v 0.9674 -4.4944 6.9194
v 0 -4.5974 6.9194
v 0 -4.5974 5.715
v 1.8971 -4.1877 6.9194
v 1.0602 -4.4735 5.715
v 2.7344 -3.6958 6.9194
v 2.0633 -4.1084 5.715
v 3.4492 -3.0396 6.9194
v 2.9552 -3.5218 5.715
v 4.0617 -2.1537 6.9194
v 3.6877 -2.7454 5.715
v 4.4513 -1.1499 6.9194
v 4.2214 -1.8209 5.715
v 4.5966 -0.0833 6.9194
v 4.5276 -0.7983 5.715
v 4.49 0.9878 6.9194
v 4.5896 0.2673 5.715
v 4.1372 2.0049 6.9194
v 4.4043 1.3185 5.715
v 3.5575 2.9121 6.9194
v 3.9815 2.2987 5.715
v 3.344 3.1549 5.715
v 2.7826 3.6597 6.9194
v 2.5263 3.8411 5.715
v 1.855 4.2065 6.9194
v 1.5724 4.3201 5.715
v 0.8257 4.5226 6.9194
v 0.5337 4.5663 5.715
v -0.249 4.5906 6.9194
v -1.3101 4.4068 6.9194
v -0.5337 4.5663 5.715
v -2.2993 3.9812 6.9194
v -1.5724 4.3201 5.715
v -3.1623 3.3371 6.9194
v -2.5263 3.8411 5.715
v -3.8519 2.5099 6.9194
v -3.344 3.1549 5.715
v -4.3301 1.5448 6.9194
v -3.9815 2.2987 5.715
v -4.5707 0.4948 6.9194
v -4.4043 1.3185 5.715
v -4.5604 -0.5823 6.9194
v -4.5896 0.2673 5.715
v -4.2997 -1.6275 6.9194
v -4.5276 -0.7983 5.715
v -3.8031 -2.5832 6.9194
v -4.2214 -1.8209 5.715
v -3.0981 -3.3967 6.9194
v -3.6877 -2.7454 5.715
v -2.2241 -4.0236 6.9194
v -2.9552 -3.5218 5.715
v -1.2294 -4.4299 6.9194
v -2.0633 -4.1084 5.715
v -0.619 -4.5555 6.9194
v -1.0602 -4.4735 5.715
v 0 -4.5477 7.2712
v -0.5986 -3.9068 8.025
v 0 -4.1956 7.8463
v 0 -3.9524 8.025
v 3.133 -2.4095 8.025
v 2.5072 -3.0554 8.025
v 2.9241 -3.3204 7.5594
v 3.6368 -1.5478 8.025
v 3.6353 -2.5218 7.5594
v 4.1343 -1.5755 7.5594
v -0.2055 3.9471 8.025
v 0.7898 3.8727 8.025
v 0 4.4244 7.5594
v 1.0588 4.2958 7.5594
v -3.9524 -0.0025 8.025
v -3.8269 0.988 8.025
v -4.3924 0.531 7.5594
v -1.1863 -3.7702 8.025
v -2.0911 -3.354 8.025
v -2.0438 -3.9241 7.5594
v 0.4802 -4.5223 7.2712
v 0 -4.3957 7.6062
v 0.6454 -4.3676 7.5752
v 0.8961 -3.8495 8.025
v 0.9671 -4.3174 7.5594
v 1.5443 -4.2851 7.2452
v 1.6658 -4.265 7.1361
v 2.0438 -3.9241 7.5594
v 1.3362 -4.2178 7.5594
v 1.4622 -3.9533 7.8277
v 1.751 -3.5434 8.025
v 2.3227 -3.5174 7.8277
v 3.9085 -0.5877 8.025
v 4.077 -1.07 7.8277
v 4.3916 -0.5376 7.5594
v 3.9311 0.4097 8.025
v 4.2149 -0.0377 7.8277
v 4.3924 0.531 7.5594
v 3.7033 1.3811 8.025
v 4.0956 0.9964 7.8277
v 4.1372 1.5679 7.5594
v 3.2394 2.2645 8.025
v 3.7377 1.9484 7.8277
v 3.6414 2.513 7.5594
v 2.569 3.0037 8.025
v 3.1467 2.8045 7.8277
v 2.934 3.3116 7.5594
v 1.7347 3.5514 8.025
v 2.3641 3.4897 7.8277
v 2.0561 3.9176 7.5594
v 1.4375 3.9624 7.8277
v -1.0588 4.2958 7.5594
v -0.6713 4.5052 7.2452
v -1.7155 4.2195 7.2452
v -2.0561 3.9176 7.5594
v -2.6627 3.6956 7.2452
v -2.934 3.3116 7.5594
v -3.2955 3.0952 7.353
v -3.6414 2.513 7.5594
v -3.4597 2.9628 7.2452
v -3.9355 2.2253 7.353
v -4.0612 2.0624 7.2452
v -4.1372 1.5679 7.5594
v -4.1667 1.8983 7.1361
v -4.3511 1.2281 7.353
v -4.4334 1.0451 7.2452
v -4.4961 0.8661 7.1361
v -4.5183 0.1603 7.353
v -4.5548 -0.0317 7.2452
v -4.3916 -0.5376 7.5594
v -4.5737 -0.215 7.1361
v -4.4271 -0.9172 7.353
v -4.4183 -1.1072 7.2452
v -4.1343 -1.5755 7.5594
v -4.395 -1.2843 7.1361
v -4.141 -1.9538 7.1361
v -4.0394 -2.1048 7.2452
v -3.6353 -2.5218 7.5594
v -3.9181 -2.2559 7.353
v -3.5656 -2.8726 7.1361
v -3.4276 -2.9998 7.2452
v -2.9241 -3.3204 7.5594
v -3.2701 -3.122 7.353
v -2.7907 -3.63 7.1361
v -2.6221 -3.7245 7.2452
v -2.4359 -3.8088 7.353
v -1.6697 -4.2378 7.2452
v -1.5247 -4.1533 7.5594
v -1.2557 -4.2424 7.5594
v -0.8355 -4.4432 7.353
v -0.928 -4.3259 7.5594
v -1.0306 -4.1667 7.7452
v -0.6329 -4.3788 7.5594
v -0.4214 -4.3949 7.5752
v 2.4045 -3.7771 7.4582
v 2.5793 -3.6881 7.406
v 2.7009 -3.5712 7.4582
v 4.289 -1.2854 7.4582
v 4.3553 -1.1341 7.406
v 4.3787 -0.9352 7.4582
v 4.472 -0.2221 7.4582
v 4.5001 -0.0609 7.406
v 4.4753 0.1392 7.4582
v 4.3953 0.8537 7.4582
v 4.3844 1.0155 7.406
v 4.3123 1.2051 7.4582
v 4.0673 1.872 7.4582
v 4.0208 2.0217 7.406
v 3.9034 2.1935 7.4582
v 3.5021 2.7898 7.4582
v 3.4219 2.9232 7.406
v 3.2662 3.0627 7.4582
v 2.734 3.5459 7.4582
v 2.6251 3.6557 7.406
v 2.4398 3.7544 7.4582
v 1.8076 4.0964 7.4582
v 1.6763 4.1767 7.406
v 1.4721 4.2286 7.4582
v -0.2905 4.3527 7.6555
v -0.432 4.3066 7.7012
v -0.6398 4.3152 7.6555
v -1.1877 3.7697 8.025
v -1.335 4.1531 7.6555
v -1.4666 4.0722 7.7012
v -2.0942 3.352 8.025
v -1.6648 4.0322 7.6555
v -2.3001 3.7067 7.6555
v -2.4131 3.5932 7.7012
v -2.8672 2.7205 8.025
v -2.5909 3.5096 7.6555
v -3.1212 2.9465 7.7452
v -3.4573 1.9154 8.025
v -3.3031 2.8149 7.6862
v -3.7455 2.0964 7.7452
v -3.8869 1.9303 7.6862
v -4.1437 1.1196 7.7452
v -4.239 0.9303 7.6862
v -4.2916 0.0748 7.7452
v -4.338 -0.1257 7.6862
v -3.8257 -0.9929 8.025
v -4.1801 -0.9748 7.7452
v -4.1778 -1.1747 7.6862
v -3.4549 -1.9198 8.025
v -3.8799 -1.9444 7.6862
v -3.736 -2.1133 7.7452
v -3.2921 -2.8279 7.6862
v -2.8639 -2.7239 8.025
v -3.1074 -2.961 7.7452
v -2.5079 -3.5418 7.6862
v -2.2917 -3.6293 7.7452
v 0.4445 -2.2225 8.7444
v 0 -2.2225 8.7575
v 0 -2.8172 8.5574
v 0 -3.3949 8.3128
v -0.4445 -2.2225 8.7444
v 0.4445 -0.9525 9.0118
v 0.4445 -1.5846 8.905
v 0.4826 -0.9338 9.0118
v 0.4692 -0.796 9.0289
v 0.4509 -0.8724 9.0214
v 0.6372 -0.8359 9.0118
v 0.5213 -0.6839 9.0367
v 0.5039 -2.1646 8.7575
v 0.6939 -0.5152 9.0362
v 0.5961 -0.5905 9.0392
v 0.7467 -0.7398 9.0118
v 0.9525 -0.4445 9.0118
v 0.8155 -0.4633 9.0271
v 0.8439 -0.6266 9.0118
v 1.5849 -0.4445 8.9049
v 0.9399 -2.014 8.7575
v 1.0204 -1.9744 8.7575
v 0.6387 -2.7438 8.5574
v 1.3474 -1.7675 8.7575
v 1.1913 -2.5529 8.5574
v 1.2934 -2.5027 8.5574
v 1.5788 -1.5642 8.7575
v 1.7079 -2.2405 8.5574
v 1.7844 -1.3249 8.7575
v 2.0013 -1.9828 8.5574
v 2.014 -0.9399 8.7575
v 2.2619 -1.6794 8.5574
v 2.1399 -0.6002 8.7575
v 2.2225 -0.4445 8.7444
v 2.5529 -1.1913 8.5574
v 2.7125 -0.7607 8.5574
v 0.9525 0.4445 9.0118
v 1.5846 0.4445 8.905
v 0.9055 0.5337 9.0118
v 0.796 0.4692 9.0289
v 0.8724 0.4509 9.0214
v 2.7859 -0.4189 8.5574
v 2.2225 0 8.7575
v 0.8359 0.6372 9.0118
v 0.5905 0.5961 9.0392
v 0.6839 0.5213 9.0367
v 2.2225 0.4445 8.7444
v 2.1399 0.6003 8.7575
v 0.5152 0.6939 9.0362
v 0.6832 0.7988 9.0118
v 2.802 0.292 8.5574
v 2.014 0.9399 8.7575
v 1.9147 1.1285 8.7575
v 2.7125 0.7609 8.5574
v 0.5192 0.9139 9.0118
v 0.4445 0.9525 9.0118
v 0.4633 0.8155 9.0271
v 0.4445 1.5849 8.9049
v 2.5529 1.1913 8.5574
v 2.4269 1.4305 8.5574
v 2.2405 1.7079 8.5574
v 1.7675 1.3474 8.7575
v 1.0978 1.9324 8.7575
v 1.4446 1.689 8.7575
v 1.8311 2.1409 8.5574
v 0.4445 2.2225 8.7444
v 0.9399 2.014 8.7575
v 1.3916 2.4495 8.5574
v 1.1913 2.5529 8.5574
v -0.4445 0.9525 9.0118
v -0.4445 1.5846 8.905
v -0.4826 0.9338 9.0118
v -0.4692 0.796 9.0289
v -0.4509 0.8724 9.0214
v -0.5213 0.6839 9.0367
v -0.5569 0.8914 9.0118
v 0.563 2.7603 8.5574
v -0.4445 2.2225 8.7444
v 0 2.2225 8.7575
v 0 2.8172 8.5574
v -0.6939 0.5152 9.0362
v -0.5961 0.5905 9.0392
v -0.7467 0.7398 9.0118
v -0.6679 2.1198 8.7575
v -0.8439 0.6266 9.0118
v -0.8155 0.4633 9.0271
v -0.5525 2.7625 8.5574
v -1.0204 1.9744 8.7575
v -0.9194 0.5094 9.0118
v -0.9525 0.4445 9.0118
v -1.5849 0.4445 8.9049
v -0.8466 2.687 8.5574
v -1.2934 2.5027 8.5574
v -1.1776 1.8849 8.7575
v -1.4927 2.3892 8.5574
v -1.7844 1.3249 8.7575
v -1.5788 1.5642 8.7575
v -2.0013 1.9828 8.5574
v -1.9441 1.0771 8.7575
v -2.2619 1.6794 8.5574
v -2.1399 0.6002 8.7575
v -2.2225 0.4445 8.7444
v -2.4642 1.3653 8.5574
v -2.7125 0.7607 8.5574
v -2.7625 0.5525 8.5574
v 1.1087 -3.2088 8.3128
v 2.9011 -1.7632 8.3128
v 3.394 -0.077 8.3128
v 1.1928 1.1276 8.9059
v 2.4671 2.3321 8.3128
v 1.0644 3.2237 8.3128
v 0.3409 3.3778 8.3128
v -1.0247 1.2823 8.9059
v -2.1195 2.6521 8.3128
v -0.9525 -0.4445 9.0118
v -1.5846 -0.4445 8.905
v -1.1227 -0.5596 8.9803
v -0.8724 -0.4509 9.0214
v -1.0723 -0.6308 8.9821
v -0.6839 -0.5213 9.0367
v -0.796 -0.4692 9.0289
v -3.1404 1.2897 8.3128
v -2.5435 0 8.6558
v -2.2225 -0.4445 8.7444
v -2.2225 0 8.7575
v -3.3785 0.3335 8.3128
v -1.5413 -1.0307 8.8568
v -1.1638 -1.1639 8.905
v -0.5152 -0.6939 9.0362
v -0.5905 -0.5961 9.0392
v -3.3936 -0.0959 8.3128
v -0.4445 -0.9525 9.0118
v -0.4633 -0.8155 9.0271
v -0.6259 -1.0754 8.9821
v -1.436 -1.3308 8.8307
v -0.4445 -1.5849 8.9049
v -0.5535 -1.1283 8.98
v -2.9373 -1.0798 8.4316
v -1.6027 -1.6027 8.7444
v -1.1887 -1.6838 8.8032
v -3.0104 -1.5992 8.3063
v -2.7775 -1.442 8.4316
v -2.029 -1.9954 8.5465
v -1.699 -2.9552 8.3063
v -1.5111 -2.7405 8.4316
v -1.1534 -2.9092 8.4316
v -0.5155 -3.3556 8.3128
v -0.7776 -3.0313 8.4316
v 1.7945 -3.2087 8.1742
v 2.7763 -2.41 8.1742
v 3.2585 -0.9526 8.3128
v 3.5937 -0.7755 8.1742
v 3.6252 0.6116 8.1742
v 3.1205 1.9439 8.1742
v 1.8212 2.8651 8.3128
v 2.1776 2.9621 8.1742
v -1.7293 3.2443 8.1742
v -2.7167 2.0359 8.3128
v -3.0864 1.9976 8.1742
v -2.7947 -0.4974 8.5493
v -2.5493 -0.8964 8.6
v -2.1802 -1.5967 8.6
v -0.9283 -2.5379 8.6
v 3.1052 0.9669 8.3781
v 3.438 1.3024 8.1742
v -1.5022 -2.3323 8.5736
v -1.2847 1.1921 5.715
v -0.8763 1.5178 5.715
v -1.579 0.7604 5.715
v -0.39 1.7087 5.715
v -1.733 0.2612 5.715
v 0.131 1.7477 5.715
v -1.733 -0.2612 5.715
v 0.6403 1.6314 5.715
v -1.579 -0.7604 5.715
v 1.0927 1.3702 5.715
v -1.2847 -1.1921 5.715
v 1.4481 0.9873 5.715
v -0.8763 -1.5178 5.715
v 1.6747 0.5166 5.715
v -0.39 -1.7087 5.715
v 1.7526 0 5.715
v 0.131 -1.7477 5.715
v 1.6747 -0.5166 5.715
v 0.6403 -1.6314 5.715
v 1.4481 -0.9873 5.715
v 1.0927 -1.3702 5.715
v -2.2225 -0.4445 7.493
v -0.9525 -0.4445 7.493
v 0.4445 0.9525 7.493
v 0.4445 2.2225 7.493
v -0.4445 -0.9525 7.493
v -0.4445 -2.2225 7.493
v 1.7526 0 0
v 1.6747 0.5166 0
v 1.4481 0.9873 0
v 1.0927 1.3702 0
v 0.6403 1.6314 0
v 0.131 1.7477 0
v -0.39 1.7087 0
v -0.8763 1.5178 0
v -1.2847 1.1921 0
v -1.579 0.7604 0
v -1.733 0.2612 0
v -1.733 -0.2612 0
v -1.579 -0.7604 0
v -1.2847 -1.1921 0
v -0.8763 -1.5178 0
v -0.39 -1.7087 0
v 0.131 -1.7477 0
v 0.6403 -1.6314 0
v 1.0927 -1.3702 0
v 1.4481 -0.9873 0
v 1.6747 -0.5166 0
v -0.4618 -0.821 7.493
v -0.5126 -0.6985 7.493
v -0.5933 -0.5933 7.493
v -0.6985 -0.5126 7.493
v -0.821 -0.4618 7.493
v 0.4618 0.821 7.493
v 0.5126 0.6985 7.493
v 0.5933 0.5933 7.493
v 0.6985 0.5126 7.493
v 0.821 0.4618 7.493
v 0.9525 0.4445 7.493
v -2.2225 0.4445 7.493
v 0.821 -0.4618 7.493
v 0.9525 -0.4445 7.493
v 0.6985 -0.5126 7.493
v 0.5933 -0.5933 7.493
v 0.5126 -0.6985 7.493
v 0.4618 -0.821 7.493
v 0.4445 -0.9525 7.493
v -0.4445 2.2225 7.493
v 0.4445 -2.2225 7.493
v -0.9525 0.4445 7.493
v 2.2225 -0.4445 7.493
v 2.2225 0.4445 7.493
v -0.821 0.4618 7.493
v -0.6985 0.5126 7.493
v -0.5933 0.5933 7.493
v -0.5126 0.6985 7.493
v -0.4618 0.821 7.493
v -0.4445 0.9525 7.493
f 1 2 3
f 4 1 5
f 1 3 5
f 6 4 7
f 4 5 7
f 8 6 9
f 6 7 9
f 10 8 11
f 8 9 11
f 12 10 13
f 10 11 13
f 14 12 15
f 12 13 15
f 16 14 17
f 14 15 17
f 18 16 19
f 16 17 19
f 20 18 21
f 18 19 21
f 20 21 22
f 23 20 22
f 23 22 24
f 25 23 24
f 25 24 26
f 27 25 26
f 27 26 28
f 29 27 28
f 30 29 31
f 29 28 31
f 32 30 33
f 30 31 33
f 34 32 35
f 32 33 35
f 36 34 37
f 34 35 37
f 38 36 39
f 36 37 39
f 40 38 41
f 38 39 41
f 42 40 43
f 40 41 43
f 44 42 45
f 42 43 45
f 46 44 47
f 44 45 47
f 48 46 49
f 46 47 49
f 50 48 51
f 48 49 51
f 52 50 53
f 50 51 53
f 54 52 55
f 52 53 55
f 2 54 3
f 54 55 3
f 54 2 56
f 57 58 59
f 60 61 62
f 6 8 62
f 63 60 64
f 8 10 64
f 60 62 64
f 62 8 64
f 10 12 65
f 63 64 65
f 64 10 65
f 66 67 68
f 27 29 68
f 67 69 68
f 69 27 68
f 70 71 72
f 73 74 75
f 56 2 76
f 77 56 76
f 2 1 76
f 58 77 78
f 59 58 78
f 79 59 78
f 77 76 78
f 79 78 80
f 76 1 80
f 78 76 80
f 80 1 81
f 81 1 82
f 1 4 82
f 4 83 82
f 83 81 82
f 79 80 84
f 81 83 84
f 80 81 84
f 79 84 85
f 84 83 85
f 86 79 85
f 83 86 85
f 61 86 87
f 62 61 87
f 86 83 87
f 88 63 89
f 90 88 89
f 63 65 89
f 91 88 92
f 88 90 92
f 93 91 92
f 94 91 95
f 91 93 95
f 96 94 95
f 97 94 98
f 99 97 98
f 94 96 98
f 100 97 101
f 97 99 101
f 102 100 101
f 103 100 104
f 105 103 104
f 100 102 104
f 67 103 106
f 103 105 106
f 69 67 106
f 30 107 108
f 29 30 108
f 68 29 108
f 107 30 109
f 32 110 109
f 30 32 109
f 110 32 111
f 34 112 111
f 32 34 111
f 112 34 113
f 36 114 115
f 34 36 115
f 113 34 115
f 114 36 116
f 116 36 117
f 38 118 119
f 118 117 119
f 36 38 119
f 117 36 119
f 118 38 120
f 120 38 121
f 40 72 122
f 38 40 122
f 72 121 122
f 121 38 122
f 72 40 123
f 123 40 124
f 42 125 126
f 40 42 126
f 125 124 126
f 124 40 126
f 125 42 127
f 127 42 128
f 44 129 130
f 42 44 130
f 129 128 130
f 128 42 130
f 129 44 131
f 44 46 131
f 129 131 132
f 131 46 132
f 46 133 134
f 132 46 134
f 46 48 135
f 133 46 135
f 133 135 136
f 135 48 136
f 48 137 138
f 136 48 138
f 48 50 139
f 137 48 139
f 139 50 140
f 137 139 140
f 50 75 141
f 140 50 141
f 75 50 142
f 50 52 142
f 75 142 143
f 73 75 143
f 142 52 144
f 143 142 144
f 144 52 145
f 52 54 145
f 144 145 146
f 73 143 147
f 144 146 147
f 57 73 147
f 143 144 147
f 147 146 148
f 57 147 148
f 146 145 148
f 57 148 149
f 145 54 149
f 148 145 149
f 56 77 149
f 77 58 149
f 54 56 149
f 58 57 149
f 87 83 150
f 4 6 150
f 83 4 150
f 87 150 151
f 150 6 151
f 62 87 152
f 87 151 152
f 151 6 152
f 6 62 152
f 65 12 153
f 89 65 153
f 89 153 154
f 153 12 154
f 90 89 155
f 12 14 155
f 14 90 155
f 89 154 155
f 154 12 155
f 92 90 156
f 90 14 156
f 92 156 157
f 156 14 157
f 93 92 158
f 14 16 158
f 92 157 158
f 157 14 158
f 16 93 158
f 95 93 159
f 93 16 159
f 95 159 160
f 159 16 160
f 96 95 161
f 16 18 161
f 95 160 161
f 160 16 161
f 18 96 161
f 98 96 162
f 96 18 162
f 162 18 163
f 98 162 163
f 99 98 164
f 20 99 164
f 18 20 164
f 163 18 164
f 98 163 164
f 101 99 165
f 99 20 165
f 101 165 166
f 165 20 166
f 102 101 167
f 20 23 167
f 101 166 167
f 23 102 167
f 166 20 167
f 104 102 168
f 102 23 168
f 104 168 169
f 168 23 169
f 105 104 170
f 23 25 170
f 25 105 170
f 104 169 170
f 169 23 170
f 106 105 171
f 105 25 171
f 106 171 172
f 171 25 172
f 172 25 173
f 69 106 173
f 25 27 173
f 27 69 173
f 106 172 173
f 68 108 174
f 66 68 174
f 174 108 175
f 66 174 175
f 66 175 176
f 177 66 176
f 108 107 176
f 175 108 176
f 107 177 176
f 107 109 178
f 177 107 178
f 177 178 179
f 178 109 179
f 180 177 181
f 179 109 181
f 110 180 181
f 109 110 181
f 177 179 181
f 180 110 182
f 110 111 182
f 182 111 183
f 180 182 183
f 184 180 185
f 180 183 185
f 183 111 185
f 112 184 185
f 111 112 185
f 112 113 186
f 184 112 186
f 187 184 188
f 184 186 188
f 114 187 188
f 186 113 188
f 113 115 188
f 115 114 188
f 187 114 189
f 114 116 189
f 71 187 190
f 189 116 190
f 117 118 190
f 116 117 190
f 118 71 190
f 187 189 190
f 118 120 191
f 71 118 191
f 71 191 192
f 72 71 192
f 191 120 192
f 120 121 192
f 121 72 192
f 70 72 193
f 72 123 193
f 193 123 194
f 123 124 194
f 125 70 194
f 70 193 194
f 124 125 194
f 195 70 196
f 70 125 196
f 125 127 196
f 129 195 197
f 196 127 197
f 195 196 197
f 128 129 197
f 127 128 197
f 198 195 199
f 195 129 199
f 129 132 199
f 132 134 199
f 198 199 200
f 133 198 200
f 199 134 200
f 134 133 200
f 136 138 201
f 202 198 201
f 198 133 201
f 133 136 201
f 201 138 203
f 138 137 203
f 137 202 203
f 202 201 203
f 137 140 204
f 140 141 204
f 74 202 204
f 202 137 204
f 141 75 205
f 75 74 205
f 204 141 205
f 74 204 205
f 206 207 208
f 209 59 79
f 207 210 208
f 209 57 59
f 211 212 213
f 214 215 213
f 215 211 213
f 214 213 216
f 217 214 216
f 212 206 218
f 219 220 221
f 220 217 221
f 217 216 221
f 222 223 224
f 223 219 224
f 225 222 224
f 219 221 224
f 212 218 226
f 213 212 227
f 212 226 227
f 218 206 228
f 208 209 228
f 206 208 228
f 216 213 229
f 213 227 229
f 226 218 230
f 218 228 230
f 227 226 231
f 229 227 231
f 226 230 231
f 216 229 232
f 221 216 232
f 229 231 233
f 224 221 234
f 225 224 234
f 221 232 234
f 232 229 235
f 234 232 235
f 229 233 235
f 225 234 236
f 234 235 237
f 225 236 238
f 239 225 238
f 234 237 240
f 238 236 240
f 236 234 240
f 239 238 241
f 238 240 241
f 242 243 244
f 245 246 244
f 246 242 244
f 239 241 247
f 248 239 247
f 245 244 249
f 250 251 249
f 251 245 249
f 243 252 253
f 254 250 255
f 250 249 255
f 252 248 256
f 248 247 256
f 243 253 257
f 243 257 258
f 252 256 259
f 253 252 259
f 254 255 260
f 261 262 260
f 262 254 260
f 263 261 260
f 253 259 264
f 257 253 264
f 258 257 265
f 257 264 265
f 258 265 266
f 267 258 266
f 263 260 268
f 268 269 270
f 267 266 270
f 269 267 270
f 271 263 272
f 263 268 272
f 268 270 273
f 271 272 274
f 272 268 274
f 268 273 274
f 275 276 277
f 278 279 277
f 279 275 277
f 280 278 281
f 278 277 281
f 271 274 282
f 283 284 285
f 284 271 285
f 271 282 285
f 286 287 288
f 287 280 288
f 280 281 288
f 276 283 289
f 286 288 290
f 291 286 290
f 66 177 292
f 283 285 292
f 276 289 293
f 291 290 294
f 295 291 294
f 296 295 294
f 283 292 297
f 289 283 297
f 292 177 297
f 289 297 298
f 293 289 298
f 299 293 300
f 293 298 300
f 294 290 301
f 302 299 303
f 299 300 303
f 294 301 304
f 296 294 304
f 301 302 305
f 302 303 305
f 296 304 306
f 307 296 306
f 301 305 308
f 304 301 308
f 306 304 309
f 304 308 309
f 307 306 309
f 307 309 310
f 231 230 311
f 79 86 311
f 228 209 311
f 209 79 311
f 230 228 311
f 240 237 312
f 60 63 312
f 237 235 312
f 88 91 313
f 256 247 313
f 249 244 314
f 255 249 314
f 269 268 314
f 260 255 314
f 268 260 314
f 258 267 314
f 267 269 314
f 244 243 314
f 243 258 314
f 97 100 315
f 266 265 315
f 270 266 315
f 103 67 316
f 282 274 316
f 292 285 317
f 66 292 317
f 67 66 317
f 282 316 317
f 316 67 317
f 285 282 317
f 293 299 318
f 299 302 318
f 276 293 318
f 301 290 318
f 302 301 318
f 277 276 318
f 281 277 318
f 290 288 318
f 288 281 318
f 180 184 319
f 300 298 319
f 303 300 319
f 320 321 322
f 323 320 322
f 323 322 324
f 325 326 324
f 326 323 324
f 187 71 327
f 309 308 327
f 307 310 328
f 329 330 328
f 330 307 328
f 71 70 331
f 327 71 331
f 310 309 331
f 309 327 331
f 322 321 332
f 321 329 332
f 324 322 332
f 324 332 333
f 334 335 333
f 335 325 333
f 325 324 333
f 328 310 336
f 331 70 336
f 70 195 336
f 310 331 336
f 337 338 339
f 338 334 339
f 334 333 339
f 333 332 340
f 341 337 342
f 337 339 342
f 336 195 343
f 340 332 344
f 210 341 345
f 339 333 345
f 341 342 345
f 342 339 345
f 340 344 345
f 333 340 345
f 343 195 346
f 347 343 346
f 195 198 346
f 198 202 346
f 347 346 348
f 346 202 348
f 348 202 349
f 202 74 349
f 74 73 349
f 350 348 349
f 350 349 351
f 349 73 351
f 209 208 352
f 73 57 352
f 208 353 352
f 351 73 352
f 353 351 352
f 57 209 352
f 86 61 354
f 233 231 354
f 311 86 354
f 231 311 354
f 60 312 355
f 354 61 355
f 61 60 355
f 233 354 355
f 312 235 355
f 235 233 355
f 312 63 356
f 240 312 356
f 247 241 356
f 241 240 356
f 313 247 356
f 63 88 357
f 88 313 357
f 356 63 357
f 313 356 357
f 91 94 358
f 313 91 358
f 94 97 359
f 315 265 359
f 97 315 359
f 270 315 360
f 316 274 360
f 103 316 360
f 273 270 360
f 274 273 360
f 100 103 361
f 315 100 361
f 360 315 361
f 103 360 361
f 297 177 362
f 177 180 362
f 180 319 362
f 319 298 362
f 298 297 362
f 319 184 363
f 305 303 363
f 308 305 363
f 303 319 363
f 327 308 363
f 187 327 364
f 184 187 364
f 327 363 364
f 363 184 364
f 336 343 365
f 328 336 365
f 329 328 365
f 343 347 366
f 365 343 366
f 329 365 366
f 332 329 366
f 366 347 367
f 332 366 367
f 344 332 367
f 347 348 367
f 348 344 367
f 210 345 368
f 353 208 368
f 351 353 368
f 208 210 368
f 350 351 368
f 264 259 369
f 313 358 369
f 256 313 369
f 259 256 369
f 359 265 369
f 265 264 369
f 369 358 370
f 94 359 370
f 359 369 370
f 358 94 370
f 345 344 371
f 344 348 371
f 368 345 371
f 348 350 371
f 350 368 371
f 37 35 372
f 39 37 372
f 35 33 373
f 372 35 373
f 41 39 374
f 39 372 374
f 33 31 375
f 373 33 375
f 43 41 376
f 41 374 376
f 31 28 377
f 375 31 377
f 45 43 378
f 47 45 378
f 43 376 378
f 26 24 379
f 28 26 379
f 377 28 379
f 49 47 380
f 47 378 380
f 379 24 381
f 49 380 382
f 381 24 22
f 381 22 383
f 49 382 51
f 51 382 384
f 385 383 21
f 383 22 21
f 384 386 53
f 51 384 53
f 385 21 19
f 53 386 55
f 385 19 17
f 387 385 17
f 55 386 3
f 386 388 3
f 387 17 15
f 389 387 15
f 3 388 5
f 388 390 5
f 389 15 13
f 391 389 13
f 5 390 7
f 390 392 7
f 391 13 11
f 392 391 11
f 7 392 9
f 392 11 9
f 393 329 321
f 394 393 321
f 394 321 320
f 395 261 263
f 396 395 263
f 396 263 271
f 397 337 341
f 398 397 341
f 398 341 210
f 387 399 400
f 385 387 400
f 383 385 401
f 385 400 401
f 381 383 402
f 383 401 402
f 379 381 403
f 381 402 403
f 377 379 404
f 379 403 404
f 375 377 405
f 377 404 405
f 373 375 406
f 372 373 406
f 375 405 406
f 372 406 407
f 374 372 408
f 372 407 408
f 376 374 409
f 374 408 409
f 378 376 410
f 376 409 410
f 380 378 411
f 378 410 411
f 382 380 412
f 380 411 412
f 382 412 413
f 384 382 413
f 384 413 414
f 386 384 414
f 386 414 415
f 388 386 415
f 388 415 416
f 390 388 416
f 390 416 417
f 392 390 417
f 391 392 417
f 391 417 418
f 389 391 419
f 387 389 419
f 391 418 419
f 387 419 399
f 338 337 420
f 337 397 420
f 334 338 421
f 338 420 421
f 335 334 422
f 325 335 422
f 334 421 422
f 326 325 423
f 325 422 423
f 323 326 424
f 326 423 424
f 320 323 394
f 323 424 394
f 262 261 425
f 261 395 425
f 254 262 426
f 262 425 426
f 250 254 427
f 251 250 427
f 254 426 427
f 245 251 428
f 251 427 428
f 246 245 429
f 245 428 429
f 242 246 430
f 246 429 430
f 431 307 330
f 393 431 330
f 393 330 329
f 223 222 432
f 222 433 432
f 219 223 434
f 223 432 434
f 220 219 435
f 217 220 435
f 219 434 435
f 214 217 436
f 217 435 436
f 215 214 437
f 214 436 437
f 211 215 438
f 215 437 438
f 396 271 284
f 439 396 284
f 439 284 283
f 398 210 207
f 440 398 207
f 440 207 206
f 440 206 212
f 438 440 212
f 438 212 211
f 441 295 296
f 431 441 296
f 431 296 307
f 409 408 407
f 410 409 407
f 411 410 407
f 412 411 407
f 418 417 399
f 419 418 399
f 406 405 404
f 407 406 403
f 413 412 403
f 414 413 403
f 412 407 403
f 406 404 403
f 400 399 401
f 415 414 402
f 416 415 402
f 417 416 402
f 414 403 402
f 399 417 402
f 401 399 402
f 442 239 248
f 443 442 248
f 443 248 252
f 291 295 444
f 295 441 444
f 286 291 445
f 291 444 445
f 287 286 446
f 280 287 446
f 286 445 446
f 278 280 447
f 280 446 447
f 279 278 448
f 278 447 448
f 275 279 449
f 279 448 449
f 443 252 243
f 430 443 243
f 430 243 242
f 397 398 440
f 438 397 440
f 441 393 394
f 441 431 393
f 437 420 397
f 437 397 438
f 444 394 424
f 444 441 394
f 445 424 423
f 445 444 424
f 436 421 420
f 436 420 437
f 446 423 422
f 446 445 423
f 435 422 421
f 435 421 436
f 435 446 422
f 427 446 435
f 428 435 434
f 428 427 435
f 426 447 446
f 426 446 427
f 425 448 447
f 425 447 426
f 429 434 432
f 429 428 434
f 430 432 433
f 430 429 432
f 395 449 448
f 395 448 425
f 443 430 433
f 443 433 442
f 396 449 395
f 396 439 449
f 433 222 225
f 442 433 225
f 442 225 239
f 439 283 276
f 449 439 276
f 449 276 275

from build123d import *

# Parameters (mm, degrees)
F0_R     = 1.7526
F1_DEPTH = 5.715
F4_R     = 1.27
F7_DEPTH = 2.921
F8_R     = 0.508


with BuildPart() as f1:
    # F0 (on Top) → F1 (new body)
    with BuildSketch(Plane.XY):
        Circle(F0_R)
    extrude(amount=F1_DEPTH)

    # F2 (on Right) → F3 (revolve)
    with BuildSketch(Plane.YZ):
        with BuildLine():
            Line((-4.5974, 7.62), (-4.5974, 5.715))
            Line((-4.5974, 5.715), (0, 5.715))
            Line((0, 5.715), (0, 9.0932))
            ThreePointArc((0, 9.0932), (-2.4088, 8.700189), (-4.5974, 7.62))
        make_face()
    revolve(axis=Axis((0, 0, 4.5466), (0, 0, 1)))

    # F4
    f4_edges = [f1.edges().sort_by_distance(p)[0] for p in [
        (0, 4.5974, 7.62),
    ]]
    fillet(f4_edges, radius=F4_R)

    # F6 (on offset) → F7 (cut)
    with BuildSketch(Plane.XY.offset(10.414)):
        Polygon((-2.2225, 0.4445), (-2.2225, -0.4445), (-0.4445, -0.4445), (-0.4445, -2.2225), (0.4445, -2.2225), (0.4445, -0.4445), (2.2225, -0.4445), (2.2225, 0.4445), (0.4445, 0.4445), (0.4445, 2.2225), (-0.4445, 2.2225), (-0.4445, 0.4445), align=None)
    extrude(amount=-F7_DEPTH, mode=Mode.SUBTRACT)

    # F8
    f8_edges = [f1.edges().sort_by_distance(p)[0] for p in [
        (-0.4445, 0.4445, 8.276901),
        (0.4445, 0.4445, 8.276901),
        (-0.4445, -0.4445, 8.276901),
        (0.4445, -0.4445, 8.276901),
    ]]
    fillet(f8_edges, radius=F8_R)


solid = f1.part
